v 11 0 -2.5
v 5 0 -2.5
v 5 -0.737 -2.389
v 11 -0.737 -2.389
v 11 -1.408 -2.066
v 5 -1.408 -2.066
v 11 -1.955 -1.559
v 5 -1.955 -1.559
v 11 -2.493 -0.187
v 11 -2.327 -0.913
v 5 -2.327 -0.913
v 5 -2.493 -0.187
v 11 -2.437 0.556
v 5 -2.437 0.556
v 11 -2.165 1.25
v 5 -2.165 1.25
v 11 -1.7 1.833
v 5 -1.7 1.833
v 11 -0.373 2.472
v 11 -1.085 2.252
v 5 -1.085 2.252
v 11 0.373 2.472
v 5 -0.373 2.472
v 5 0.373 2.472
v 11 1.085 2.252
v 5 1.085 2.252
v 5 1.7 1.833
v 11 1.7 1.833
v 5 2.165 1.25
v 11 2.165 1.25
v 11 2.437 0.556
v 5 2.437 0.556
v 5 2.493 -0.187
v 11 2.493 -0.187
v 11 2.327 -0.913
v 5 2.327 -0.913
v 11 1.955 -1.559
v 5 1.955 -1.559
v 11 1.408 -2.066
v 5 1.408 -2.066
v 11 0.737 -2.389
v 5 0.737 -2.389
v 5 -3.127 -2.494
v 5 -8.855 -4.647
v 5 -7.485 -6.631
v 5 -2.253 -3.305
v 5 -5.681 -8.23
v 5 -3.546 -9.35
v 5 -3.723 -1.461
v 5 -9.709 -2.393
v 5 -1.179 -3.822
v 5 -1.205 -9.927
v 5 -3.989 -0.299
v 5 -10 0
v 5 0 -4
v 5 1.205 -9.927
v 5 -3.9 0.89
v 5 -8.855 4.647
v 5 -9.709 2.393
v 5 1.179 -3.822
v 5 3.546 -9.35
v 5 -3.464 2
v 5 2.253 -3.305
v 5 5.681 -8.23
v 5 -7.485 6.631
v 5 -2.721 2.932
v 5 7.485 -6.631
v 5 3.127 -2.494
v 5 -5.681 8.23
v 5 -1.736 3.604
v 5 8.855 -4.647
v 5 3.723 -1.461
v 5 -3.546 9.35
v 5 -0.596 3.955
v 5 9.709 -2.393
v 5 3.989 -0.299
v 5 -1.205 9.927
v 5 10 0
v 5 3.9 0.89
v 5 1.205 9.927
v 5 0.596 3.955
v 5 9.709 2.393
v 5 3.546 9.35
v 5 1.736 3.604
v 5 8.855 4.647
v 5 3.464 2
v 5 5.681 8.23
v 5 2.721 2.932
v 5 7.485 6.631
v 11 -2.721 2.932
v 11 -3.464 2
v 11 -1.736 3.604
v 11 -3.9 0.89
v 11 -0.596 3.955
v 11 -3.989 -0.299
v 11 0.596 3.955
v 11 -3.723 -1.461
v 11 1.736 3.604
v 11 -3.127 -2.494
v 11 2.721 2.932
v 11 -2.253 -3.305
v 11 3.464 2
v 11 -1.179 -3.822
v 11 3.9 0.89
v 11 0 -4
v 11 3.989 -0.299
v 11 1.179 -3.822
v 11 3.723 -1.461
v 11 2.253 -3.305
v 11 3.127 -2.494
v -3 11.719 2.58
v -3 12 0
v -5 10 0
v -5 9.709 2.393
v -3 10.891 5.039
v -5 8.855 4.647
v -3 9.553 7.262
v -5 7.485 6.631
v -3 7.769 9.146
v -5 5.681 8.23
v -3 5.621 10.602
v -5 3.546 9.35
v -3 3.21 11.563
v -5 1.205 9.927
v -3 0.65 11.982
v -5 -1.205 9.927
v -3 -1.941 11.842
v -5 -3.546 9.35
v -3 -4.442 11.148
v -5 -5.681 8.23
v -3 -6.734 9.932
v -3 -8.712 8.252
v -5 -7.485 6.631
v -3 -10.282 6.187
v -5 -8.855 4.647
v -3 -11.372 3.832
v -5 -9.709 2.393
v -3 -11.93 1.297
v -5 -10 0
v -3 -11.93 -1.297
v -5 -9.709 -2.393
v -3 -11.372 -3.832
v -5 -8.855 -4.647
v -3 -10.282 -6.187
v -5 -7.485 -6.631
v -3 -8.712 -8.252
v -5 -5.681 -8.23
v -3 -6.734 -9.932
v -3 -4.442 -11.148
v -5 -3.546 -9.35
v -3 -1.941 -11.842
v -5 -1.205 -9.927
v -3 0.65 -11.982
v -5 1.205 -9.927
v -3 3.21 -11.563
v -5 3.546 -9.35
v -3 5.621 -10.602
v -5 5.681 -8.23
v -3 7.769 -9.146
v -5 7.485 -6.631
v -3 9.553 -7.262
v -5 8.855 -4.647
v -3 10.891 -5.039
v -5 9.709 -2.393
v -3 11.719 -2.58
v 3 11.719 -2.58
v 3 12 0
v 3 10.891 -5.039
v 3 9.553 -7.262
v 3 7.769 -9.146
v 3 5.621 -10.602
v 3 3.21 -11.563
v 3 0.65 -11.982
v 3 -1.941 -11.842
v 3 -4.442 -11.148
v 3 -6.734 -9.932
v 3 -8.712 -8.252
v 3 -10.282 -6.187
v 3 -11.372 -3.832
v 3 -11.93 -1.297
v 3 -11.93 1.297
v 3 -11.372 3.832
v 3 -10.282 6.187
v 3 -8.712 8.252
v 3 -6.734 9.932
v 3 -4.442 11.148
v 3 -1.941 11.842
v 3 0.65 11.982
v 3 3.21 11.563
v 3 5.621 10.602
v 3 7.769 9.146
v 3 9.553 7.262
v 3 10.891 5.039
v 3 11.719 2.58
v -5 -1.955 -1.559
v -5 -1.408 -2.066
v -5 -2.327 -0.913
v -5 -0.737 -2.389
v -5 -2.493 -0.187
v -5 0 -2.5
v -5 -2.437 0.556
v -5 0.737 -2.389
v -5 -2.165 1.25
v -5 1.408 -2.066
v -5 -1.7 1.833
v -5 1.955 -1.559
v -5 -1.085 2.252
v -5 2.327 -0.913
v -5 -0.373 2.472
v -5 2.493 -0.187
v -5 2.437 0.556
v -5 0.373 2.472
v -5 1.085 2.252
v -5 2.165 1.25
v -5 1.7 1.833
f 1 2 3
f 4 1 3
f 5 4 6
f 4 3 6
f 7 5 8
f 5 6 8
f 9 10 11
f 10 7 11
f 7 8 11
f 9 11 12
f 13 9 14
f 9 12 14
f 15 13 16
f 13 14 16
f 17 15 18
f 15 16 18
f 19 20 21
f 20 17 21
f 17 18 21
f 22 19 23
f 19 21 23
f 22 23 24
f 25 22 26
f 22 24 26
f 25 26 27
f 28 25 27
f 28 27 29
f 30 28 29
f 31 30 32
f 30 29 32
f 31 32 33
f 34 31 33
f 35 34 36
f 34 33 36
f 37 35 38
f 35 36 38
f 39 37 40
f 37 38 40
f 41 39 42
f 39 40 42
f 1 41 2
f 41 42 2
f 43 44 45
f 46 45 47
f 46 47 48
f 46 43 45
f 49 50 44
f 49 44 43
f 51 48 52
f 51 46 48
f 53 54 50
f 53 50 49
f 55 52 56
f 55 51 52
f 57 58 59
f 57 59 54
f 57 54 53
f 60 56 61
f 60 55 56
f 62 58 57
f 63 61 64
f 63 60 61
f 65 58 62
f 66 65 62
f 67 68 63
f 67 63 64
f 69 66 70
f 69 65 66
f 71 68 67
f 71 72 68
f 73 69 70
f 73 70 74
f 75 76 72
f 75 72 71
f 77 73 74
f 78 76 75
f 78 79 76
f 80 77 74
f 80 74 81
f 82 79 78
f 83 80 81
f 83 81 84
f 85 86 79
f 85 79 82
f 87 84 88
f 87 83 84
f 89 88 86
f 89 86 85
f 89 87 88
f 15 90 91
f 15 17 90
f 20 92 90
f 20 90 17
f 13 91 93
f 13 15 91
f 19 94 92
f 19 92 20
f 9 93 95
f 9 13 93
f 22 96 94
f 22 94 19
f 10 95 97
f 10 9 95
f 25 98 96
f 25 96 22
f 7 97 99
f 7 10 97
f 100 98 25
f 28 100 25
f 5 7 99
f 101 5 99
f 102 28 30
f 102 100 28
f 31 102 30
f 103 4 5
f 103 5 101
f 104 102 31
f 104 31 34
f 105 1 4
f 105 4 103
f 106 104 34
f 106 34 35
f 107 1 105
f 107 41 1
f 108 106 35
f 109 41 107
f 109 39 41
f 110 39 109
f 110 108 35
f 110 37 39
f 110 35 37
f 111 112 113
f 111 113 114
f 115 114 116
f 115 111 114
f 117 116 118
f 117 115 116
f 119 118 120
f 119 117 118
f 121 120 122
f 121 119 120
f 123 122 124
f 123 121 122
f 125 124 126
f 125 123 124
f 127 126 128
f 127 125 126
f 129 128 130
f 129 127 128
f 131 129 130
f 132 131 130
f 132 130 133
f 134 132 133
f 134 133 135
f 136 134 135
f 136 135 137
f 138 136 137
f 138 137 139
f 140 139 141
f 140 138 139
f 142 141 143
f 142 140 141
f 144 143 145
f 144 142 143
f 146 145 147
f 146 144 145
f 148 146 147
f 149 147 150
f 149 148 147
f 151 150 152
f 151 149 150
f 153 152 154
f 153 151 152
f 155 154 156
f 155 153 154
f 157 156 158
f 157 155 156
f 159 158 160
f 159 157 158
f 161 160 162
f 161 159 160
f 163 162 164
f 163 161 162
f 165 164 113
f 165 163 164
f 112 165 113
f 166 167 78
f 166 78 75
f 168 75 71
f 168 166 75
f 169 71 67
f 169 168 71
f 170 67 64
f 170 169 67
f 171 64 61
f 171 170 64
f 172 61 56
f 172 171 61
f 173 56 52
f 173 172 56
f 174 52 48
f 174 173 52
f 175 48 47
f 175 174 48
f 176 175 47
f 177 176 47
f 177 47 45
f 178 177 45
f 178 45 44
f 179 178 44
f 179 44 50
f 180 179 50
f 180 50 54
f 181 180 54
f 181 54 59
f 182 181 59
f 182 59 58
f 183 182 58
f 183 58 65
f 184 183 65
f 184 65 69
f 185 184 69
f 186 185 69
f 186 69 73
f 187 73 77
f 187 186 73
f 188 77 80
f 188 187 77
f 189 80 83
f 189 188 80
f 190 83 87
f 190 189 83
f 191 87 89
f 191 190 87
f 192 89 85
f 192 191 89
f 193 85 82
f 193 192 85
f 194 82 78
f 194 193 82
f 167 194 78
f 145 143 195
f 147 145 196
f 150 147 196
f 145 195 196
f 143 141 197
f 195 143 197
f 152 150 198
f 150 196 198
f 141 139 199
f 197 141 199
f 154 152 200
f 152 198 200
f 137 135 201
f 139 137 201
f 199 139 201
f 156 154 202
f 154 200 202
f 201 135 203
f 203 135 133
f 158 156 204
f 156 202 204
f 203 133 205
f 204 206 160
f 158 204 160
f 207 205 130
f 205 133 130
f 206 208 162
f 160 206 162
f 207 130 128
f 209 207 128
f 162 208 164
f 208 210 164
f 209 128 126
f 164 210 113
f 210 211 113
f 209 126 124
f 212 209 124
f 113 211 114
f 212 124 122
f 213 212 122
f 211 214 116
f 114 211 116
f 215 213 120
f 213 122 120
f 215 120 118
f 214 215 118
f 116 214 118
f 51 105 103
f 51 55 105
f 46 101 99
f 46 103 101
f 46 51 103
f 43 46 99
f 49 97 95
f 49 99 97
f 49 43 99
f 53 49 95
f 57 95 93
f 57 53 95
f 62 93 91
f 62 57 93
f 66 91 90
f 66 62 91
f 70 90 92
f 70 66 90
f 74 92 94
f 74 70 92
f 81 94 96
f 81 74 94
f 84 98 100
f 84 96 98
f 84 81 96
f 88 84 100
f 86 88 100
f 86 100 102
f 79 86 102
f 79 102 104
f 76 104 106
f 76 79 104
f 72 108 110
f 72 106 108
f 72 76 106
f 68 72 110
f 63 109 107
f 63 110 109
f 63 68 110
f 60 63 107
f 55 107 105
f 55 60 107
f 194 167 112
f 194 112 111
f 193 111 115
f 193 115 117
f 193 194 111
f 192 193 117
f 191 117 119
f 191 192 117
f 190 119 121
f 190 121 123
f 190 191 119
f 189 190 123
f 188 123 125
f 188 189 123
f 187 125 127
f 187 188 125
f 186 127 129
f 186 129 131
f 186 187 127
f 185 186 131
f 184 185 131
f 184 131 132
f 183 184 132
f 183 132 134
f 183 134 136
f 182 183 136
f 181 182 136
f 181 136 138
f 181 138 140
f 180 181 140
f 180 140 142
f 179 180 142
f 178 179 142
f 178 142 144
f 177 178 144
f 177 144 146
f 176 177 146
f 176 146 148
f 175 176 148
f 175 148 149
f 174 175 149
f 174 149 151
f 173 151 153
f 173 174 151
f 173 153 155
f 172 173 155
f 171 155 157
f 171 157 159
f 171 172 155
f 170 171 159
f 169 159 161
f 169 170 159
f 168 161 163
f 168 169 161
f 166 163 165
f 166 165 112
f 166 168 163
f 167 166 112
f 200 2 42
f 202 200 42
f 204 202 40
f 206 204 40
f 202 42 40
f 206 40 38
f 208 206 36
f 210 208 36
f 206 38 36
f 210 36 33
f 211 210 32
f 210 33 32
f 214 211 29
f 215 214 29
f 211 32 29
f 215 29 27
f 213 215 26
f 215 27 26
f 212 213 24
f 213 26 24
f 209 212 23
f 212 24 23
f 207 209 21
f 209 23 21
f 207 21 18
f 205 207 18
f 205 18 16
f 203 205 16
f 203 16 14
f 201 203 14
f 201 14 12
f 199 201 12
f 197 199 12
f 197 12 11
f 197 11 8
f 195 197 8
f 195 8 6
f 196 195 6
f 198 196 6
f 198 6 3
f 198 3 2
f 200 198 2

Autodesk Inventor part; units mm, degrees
ref_plane "YZ Plane" through (0, 0, 0) normal (1, 0, 0) x (0, 1, 0)
ref_plane "XZ Plane" through (0, 0, 0) normal (0, 1, 0) x (-1, 0, 0)
ref_plane "XY Plane" through (0, 0, 0) normal (0, 0, 1) x (1, 0, 0)
sketch "Sketch1" plane through (0, 0, 0) normal (0, 0, 1) x (1, 0, 0)
  line L0 (-5, 0) -> (5, 0)
  line L1 (-5, 0) -> (-5, 10)
  line L2 (-5, 10) -> (-3, 12)
  line L3 (-3, 12) -> (3, 12)
  line L4 (3, 12) -> (5, 10)
  line L5 (5, 10) -> (5, 0)
  point P0 (0, 0)
  point P1 (0, 0)
  point P2 (0, 12)
  dimension "d0" = 10
  dimension "d1" = 24
  dimension "d2" = 6
  dimension "d3" = 20
revolve "Revolution1" add sketch "Sketch1" angle 360 about axis through (-5, 0, 0) along (1, 0, 0)
sketch "Sketch2" plane through (5, 0, 0) normal (1, 0, 0) x (0, 0, -1)
  circle A0 centre (0, 0) radius 2.5
  dimension "d5" = 5
extrude "Extrusion1" cut sketch "Sketch2" against normal through all
sketch "Sketch3" plane through (5, 0, 0) normal (1, 0, 0) x (0, 0, -1)
  circle A0 centre (0, 0) radius 4
  circle A1 centre (0, 0) radius 2.5 projected
  dimension "d8" = 8
extrude "Extrusion2" add sketch "Sketch3" along normal blind 6
properties part number "wheel"
